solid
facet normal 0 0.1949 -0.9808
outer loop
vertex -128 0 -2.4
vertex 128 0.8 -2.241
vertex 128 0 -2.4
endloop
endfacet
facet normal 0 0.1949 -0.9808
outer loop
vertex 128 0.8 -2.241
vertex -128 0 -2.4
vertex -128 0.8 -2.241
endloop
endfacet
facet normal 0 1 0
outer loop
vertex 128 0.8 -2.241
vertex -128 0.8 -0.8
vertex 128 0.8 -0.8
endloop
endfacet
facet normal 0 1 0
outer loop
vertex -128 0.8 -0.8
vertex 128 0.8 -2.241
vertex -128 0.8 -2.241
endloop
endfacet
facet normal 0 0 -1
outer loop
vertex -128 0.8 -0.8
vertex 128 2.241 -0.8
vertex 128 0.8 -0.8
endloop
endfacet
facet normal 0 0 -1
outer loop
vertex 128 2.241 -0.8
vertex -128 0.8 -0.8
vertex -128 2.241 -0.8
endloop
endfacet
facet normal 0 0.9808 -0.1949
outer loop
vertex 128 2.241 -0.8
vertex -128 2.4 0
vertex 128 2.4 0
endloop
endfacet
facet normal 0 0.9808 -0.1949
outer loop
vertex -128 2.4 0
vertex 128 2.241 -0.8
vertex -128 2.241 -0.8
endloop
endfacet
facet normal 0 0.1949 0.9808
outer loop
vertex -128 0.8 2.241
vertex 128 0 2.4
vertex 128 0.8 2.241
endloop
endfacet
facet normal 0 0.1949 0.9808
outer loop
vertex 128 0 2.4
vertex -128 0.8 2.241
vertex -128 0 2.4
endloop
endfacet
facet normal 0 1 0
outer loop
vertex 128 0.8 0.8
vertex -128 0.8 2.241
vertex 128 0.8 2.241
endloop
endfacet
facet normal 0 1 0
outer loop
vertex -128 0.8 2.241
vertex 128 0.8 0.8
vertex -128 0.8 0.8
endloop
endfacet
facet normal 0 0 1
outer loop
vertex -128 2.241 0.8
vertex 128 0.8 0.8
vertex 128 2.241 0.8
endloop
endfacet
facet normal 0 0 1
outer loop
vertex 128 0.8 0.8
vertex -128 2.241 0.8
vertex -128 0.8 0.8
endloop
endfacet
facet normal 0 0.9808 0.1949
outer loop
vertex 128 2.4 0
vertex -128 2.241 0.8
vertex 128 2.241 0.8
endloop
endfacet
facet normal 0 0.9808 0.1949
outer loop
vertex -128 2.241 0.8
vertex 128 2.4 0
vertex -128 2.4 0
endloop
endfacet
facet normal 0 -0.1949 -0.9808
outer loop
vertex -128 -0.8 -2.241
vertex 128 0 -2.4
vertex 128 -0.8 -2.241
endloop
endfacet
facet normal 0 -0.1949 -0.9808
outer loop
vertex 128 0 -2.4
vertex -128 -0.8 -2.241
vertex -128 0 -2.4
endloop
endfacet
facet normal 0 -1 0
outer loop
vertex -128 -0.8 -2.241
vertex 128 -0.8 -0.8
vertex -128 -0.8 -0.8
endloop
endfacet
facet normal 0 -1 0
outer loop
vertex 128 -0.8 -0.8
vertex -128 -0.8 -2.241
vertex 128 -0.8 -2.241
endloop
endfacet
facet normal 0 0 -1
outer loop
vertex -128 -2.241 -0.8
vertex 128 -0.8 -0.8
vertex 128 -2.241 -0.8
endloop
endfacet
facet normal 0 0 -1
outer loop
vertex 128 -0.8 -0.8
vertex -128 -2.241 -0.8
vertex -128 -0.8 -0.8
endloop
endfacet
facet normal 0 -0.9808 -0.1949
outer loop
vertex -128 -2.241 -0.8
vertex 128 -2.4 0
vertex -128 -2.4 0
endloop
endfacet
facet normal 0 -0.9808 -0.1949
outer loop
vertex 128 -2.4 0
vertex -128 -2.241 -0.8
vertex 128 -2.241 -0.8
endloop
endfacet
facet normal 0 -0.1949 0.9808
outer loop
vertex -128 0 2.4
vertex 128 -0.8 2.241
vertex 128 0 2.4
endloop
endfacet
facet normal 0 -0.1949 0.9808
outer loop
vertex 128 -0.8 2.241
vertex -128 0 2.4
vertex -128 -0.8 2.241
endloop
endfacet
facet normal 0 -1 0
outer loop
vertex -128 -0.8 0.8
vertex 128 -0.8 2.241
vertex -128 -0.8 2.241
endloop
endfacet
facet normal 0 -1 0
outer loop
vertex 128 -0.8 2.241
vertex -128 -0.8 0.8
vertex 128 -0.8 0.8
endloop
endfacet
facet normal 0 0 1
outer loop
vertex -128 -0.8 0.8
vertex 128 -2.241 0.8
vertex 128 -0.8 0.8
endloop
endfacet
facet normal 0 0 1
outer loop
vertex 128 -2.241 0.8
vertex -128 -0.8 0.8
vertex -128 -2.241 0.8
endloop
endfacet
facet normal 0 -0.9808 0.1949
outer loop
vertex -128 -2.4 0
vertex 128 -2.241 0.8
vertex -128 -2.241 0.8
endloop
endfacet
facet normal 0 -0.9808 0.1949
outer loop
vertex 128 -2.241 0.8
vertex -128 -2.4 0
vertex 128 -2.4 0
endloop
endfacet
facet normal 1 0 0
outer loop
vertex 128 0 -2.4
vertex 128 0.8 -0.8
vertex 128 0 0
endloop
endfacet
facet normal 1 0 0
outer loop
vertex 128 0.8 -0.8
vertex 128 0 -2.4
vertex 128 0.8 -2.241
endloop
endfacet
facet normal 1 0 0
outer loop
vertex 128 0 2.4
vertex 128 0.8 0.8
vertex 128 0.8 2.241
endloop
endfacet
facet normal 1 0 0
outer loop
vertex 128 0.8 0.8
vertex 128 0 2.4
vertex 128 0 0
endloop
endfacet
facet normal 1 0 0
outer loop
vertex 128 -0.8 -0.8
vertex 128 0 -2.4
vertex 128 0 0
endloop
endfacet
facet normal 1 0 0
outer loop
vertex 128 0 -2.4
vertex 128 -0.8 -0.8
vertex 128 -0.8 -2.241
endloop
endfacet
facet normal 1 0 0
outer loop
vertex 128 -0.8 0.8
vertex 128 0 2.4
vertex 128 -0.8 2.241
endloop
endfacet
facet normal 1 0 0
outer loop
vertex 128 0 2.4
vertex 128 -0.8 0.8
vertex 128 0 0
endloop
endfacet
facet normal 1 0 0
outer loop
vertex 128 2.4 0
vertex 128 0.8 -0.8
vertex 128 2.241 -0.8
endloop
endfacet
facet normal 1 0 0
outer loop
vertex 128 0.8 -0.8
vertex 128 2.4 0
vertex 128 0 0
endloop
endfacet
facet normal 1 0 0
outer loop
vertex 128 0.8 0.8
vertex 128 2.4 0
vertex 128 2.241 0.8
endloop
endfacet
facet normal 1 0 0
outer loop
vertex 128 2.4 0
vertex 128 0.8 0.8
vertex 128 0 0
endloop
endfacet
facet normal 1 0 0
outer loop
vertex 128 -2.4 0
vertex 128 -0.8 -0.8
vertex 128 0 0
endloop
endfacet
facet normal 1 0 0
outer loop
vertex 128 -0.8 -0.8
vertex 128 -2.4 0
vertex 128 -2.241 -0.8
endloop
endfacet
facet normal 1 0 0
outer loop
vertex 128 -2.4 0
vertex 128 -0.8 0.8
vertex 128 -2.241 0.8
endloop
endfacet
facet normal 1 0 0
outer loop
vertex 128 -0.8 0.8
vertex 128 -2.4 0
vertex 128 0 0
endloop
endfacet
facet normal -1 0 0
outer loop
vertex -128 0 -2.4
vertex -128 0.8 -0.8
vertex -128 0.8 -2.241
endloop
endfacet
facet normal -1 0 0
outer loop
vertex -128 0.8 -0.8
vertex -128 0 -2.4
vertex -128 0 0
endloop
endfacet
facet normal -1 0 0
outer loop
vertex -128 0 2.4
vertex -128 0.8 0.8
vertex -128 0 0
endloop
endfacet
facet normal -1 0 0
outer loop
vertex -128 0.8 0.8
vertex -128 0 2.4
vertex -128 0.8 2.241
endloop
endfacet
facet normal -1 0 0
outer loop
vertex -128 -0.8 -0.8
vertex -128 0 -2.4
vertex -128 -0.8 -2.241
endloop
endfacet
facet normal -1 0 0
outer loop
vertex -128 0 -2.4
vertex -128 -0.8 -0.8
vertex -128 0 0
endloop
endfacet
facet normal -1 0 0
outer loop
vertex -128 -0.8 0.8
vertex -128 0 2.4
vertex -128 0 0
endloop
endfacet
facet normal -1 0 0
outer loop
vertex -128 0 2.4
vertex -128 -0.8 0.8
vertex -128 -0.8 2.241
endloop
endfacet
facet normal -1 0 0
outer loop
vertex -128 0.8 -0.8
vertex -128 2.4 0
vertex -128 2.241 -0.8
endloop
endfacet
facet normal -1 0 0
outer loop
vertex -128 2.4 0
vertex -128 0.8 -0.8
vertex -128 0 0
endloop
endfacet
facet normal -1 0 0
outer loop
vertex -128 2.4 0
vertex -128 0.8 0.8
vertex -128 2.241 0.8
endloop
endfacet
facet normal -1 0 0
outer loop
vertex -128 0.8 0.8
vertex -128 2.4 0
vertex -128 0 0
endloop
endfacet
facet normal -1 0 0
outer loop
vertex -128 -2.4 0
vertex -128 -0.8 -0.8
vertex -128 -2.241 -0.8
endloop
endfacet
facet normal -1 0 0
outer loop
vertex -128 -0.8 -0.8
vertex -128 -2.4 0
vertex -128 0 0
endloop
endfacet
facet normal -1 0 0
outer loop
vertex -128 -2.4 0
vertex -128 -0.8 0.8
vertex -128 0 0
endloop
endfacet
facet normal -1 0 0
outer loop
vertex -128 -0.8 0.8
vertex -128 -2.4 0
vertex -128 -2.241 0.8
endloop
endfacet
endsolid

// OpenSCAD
// file: ../p/axle.scad
use <../lib.scad>
function ldraw_lib__axle() = [
// 0 Axle
// 0 Name: axle.dat
// 0 Author: James Jessiman
// 0 !LDRAW_ORG Primitive UPDATE 2003-01
// 0 !LICENSE Licensed under CC BY 2.0 and CC BY 4.0 : see CAreadme.txt
// 
// 0 BFC CERTIFY CCW
  [0,"BFC","CERTIFY"],
  [0,"BFC","CCW"],
// 
// 0 !HISTORY 2000-04-23 [sbliss] Added conditional edges along outermost diameters
// 0 !HISTORY 2000-05-07 [PTadmin] Official Update 2000-01
// 0 !HISTORY 2002-11-08 [OrionP] Adjusted fit and precision
// 0 !HISTORY 2003-03-12 [PTadmin] Official Update 2003-01
// 0 !HISTORY 2007-06-24 [PTadmin] Header formatted for Contributor Agreement
// 0 !HISTORY 2008-07-01 [PTadmin] Official Update 2008-01
// 
// 
// 5 24 6 0 0 6 1 0 5.602 0 2 5.602 0 -2
  [5,24,6,0,0,6,1,0,5.602,0,2,5.602,0,-2],
// 5 24 0 0 6 0 1 6 2 0 5.602 -2 0 5.602
  [5,24,0,0,6,0,1,6,2,0,5.602,-2,0,5.602],
// 5 24 -6 0 0 -6 1 0 -5.602 0 -2 -5.602 0 2
  [5,24,-6,0,0,-6,1,0,-5.602,0,-2,-5.602,0,2],
// 5 24 0 0 -6 0 1 -6 -2 0 -5.602 2 0 -5.602
  [5,24,0,0,-6,0,1,-6,-2,0,-5.602,2,0,-5.602],
// 
// 2 24 6 0 0 5.602 0 2
  [2,24,6,0,0,5.602,0,2],
// 2 24 5.602 0 2 2 0 2
  [2,24,5.602,0,2,2,0,2],
// 2 24 2 0 2 2 0 5.602
  [2,24,2,0,2,2,0,5.602],
// 2 24 2 0 5.602 0 0 6
  [2,24,2,0,5.602,0,0,6],
// 2 24 -6 0 0 -5.602 0 2
  [2,24,-6,0,0,-5.602,0,2],
// 2 24 -5.602 0 2 -2 0 2
  [2,24,-5.602,0,2,-2,0,2],
// 2 24 -2 0 2 -2 0 5.602
  [2,24,-2,0,2,-2,0,5.602],
// 2 24 -2 0 5.602 -0 0 6
  [2,24,-2,0,5.602,-0,0,6],
// 2 24 6 0 -0 5.602 0 -2
  [2,24,6,0,-0,5.602,0,-2],
// 2 24 5.602 0 -2 2 0 -2
  [2,24,5.602,0,-2,2,0,-2],
// 2 24 2 0 -2 2 0 -5.602
  [2,24,2,0,-2,2,0,-5.602],
// 2 24 2 0 -5.602 0 0 -6
  [2,24,2,0,-5.602,0,0,-6],
// 2 24 -6 0 -0 -5.602 0 -2
  [2,24,-6,0,-0,-5.602,0,-2],
// 2 24 -5.602 0 -2 -2 0 -2
  [2,24,-5.602,0,-2,-2,0,-2],
// 2 24 -2 0 -2 -2 0 -5.602
  [2,24,-2,0,-2,-2,0,-5.602],
// 2 24 -2 0 -5.602 -0 0 -6
  [2,24,-2,0,-5.602,-0,0,-6],
// 2 24 6 1 0 5.602 1 2
  [2,24,6,1,0,5.602,1,2],
// 2 24 5.602 1 2 2 1 2
  [2,24,5.602,1,2,2,1,2],
// 2 24 2 1 2 2 1 5.602
  [2,24,2,1,2,2,1,5.602],
// 2 24 2 1 5.602 0 1 6
  [2,24,2,1,5.602,0,1,6],
// 2 24 -6 1 0 -5.602 1 2
  [2,24,-6,1,0,-5.602,1,2],
// 2 24 -5.602 1 2 -2 1 2
  [2,24,-5.602,1,2,-2,1,2],
// 2 24 -2 1 2 -2 1 5.602
  [2,24,-2,1,2,-2,1,5.602],
// 2 24 -2 1 5.602 -0 1 6
  [2,24,-2,1,5.602,-0,1,6],
// 2 24 6 1 -0 5.602 1 -2
  [2,24,6,1,-0,5.602,1,-2],
// 2 24 5.602 1 -2 2 1 -2
  [2,24,5.602,1,-2,2,1,-2],
// 2 24 2 1 -2 2 1 -5.602
  [2,24,2,1,-2,2,1,-5.602],
// 2 24 2 1 -5.602 0 1 -6
  [2,24,2,1,-5.602,0,1,-6],
// 2 24 -6 1 -0 -5.602 1 -2
  [2,24,-6,1,-0,-5.602,1,-2],
// 2 24 -5.602 1 -2 -2 1 -2
  [2,24,-5.602,1,-2,-2,1,-2],
// 2 24 -2 1 -2 -2 1 -5.602
  [2,24,-2,1,-2,-2,1,-5.602],
// 2 24 -2 1 -5.602 -0 1 -6
  [2,24,-2,1,-5.602,-0,1,-6],
// 
// 2 24 5.602 0 2 5.602 1 2
  [2,24,5.602,0,2,5.602,1,2],
// 2 24 2 0 2 2 1 2
  [2,24,2,0,2,2,1,2],
// 2 24 2 0 5.602 2 1 5.602
  [2,24,2,0,5.602,2,1,5.602],
// 2 24 -5.602 0 2 -5.602 1 2
  [2,24,-5.602,0,2,-5.602,1,2],
// 2 24 -2 0 2 -2 1 2
  [2,24,-2,0,2,-2,1,2],
// 2 24 -2 0 5.602 -2 1 5.602
  [2,24,-2,0,5.602,-2,1,5.602],
// 2 24 5.602 0 -2 5.602 1 -2
  [2,24,5.602,0,-2,5.602,1,-2],
// 2 24 2 0 -2 2 1 -2
  [2,24,2,0,-2,2,1,-2],
// 2 24 2 0 -5.602 2 1 -5.602
  [2,24,2,0,-5.602,2,1,-5.602],
// 2 24 -5.602 0 -2 -5.602 1 -2
  [2,24,-5.602,0,-2,-5.602,1,-2],
// 2 24 -2 0 -2 -2 1 -2
  [2,24,-2,0,-2,-2,1,-2],
// 2 24 -2 0 -5.602 -2 1 -5.602
  [2,24,-2,0,-5.602,-2,1,-5.602],
// 
// 4 16 6 0 0 6 1 0 5.602 1 2 5.602 0 2
  [4,16,6,0,0,6,1,0,5.602,1,2,5.602,0,2],
// 4 16 5.602 0 2 5.602 1 2 2 1 2 2 0 2
  [4,16,5.602,0,2,5.602,1,2,2,1,2,2,0,2],
// 4 16 2 0 2 2 1 2 2 1 5.602 2 0 5.602
  [4,16,2,0,2,2,1,2,2,1,5.602,2,0,5.602],
// 4 16 2 0 5.602 2 1 5.602 0 1 6 0 0 6
  [4,16,2,0,5.602,2,1,5.602,0,1,6,0,0,6],
// 4 16 -6 0 0 -5.602 0 2 -5.602 1 2 -6 1 0
  [4,16,-6,0,0,-5.602,0,2,-5.602,1,2,-6,1,0],
// 4 16 -5.602 0 2 -2 0 2 -2 1 2 -5.602 1 2
  [4,16,-5.602,0,2,-2,0,2,-2,1,2,-5.602,1,2],
// 4 16 -2 0 2 -2 0 5.602 -2 1 5.602 -2 1 2
  [4,16,-2,0,2,-2,0,5.602,-2,1,5.602,-2,1,2],
// 4 16 -2 0 5.602 -0 0 6 -0 1 6 -2 1 5.602
  [4,16,-2,0,5.602,-0,0,6,-0,1,6,-2,1,5.602],
// 4 16 6 0 -0 5.602 0 -2 5.602 1 -2 6 1 -0
  [4,16,6,0,-0,5.602,0,-2,5.602,1,-2,6,1,-0],
// 4 16 5.602 0 -2 2 0 -2 2 1 -2 5.602 1 -2
  [4,16,5.602,0,-2,2,0,-2,2,1,-2,5.602,1,-2],
// 4 16 2 0 -2 2 0 -5.602 2 1 -5.602 2 1 -2
  [4,16,2,0,-2,2,0,-5.602,2,1,-5.602,2,1,-2],
// 4 16 2 0 -5.602 0 0 -6 0 1 -6 2 1 -5.602
  [4,16,2,0,-5.602,0,0,-6,0,1,-6,2,1,-5.602],
// 4 16 -6 0 -0 -6 1 -0 -5.602 1 -2 -5.602 0 -2
  [4,16,-6,0,-0,-6,1,-0,-5.602,1,-2,-5.602,0,-2],
// 4 16 -5.602 0 -2 -5.602 1 -2 -2 1 -2 -2 0 -2
  [4,16,-5.602,0,-2,-5.602,1,-2,-2,1,-2,-2,0,-2],
// 4 16 -2 0 -2 -2 1 -2 -2 1 -5.602 -2 0 -5.602
  [4,16,-2,0,-2,-2,1,-2,-2,1,-5.602,-2,0,-5.602],
// 4 16 -2 0 -5.602 -2 1 -5.602 -0 1 -6 -0 0 -6
  [4,16,-2,0,-5.602,-2,1,-5.602,-0,1,-6,-0,0,-6],
// 
// 4 16 6 0 0 5.602 0 2 2 0 2 0 0 0
  [4,16,6,0,0,5.602,0,2,2,0,2,0,0,0],
// 4 16 -6 0 0 0 0 0 -2 0 2 -5.602 0 2
  [4,16,-6,0,0,0,0,0,-2,0,2,-5.602,0,2],
// 4 16 6 0 0 0 0 0 2 0 -2 5.602 0 -2
  [4,16,6,0,0,0,0,0,2,0,-2,5.602,0,-2],
// 4 16 -6 0 0 -5.602 0 -2 -2 0 -2 0 0 0
  [4,16,-6,0,0,-5.602,0,-2,-2,0,-2,0,0,0],
// 4 16 0 0 6 0 0 0 2 0 2 2 0 5.602
  [4,16,0,0,6,0,0,0,2,0,2,2,0,5.602],
// 4 16 0 0 6 -2 0 5.602 -2 0 2 0 0 0
  [4,16,0,0,6,-2,0,5.602,-2,0,2,0,0,0],
// 4 16 0 0 -6 2 0 -5.602 2 0 -2 0 0 0
  [4,16,0,0,-6,2,0,-5.602,2,0,-2,0,0,0],
// 4 16 0 0 -6 0 0 0 -2 0 -2 -2 0 -5.602
  [4,16,0,0,-6,0,0,0,-2,0,-2,-2,0,-5.602],
// 4 16 6 1 0 0 1 0 2 1 2 5.602 1 2
  [4,16,6,1,0,0,1,0,2,1,2,5.602,1,2],
// 4 16 -6 1 0 -5.602 1 2 -2 1 2 0 1 0
  [4,16,-6,1,0,-5.602,1,2,-2,1,2,0,1,0],
// 4 16 6 1 0 5.602 1 -2 2 1 -2 0 1 0
  [4,16,6,1,0,5.602,1,-2,2,1,-2,0,1,0],
// 4 16 -6 1 0 0 1 0 -2 1 -2 -5.602 1 -2
  [4,16,-6,1,0,0,1,0,-2,1,-2,-5.602,1,-2],
// 4 16 0 1 6 2 1 5.602 2 1 2 0 1 0
  [4,16,0,1,6,2,1,5.602,2,1,2,0,1,0],
// 4 16 0 1 6 0 1 0 -2 1 2 -2 1 5.602
  [4,16,0,1,6,0,1,0,-2,1,2,-2,1,5.602],
// 4 16 0 1 -6 0 1 0 2 1 -2 2 1 -5.602
  [4,16,0,1,-6,0,1,0,2,1,-2,2,1,-5.602],
// 4 16 0 1 -6 -2 1 -5.602 -2 1 -2 0 1 0
  [4,16,0,1,-6,-2,1,-5.602,-2,1,-2,0,1,0],
// 0
];
makepoly(ldraw_lib__axle(), line=0.2);
// main file
use <../lib.scad>
use <../p/axle.scad>
function ldraw_lib__50450() = [
// 0 Technic Axle 32
// 0 Name: 50450.dat
// 0 Author: Guy Vivan [guyvivan]
// 0 !LDRAW_ORG Part UPDATE 2009-01
// 0 !LICENSE Licensed under CC BY 2.0 and CC BY 4.0 : see CAreadme.txt
// 
// 0 BFC CERTIFY CCW
  [0,"BFC","CERTIFY"],
  [0,"BFC","CCW"],
// 
// 0 !HISTORY 2009-05-02 [PTadmin] Official Update 2009-01
// 
// 
// 1 16 320 0 0 0 -640 0 1 0 0 0 0 1 axle.dat
  [1,16,320,0,0,0,-640,0,1,0,0,0,0,1, ldraw_lib__axle()],
// 0
];
makepoly(ldraw_lib__50450(), line=0.2);
